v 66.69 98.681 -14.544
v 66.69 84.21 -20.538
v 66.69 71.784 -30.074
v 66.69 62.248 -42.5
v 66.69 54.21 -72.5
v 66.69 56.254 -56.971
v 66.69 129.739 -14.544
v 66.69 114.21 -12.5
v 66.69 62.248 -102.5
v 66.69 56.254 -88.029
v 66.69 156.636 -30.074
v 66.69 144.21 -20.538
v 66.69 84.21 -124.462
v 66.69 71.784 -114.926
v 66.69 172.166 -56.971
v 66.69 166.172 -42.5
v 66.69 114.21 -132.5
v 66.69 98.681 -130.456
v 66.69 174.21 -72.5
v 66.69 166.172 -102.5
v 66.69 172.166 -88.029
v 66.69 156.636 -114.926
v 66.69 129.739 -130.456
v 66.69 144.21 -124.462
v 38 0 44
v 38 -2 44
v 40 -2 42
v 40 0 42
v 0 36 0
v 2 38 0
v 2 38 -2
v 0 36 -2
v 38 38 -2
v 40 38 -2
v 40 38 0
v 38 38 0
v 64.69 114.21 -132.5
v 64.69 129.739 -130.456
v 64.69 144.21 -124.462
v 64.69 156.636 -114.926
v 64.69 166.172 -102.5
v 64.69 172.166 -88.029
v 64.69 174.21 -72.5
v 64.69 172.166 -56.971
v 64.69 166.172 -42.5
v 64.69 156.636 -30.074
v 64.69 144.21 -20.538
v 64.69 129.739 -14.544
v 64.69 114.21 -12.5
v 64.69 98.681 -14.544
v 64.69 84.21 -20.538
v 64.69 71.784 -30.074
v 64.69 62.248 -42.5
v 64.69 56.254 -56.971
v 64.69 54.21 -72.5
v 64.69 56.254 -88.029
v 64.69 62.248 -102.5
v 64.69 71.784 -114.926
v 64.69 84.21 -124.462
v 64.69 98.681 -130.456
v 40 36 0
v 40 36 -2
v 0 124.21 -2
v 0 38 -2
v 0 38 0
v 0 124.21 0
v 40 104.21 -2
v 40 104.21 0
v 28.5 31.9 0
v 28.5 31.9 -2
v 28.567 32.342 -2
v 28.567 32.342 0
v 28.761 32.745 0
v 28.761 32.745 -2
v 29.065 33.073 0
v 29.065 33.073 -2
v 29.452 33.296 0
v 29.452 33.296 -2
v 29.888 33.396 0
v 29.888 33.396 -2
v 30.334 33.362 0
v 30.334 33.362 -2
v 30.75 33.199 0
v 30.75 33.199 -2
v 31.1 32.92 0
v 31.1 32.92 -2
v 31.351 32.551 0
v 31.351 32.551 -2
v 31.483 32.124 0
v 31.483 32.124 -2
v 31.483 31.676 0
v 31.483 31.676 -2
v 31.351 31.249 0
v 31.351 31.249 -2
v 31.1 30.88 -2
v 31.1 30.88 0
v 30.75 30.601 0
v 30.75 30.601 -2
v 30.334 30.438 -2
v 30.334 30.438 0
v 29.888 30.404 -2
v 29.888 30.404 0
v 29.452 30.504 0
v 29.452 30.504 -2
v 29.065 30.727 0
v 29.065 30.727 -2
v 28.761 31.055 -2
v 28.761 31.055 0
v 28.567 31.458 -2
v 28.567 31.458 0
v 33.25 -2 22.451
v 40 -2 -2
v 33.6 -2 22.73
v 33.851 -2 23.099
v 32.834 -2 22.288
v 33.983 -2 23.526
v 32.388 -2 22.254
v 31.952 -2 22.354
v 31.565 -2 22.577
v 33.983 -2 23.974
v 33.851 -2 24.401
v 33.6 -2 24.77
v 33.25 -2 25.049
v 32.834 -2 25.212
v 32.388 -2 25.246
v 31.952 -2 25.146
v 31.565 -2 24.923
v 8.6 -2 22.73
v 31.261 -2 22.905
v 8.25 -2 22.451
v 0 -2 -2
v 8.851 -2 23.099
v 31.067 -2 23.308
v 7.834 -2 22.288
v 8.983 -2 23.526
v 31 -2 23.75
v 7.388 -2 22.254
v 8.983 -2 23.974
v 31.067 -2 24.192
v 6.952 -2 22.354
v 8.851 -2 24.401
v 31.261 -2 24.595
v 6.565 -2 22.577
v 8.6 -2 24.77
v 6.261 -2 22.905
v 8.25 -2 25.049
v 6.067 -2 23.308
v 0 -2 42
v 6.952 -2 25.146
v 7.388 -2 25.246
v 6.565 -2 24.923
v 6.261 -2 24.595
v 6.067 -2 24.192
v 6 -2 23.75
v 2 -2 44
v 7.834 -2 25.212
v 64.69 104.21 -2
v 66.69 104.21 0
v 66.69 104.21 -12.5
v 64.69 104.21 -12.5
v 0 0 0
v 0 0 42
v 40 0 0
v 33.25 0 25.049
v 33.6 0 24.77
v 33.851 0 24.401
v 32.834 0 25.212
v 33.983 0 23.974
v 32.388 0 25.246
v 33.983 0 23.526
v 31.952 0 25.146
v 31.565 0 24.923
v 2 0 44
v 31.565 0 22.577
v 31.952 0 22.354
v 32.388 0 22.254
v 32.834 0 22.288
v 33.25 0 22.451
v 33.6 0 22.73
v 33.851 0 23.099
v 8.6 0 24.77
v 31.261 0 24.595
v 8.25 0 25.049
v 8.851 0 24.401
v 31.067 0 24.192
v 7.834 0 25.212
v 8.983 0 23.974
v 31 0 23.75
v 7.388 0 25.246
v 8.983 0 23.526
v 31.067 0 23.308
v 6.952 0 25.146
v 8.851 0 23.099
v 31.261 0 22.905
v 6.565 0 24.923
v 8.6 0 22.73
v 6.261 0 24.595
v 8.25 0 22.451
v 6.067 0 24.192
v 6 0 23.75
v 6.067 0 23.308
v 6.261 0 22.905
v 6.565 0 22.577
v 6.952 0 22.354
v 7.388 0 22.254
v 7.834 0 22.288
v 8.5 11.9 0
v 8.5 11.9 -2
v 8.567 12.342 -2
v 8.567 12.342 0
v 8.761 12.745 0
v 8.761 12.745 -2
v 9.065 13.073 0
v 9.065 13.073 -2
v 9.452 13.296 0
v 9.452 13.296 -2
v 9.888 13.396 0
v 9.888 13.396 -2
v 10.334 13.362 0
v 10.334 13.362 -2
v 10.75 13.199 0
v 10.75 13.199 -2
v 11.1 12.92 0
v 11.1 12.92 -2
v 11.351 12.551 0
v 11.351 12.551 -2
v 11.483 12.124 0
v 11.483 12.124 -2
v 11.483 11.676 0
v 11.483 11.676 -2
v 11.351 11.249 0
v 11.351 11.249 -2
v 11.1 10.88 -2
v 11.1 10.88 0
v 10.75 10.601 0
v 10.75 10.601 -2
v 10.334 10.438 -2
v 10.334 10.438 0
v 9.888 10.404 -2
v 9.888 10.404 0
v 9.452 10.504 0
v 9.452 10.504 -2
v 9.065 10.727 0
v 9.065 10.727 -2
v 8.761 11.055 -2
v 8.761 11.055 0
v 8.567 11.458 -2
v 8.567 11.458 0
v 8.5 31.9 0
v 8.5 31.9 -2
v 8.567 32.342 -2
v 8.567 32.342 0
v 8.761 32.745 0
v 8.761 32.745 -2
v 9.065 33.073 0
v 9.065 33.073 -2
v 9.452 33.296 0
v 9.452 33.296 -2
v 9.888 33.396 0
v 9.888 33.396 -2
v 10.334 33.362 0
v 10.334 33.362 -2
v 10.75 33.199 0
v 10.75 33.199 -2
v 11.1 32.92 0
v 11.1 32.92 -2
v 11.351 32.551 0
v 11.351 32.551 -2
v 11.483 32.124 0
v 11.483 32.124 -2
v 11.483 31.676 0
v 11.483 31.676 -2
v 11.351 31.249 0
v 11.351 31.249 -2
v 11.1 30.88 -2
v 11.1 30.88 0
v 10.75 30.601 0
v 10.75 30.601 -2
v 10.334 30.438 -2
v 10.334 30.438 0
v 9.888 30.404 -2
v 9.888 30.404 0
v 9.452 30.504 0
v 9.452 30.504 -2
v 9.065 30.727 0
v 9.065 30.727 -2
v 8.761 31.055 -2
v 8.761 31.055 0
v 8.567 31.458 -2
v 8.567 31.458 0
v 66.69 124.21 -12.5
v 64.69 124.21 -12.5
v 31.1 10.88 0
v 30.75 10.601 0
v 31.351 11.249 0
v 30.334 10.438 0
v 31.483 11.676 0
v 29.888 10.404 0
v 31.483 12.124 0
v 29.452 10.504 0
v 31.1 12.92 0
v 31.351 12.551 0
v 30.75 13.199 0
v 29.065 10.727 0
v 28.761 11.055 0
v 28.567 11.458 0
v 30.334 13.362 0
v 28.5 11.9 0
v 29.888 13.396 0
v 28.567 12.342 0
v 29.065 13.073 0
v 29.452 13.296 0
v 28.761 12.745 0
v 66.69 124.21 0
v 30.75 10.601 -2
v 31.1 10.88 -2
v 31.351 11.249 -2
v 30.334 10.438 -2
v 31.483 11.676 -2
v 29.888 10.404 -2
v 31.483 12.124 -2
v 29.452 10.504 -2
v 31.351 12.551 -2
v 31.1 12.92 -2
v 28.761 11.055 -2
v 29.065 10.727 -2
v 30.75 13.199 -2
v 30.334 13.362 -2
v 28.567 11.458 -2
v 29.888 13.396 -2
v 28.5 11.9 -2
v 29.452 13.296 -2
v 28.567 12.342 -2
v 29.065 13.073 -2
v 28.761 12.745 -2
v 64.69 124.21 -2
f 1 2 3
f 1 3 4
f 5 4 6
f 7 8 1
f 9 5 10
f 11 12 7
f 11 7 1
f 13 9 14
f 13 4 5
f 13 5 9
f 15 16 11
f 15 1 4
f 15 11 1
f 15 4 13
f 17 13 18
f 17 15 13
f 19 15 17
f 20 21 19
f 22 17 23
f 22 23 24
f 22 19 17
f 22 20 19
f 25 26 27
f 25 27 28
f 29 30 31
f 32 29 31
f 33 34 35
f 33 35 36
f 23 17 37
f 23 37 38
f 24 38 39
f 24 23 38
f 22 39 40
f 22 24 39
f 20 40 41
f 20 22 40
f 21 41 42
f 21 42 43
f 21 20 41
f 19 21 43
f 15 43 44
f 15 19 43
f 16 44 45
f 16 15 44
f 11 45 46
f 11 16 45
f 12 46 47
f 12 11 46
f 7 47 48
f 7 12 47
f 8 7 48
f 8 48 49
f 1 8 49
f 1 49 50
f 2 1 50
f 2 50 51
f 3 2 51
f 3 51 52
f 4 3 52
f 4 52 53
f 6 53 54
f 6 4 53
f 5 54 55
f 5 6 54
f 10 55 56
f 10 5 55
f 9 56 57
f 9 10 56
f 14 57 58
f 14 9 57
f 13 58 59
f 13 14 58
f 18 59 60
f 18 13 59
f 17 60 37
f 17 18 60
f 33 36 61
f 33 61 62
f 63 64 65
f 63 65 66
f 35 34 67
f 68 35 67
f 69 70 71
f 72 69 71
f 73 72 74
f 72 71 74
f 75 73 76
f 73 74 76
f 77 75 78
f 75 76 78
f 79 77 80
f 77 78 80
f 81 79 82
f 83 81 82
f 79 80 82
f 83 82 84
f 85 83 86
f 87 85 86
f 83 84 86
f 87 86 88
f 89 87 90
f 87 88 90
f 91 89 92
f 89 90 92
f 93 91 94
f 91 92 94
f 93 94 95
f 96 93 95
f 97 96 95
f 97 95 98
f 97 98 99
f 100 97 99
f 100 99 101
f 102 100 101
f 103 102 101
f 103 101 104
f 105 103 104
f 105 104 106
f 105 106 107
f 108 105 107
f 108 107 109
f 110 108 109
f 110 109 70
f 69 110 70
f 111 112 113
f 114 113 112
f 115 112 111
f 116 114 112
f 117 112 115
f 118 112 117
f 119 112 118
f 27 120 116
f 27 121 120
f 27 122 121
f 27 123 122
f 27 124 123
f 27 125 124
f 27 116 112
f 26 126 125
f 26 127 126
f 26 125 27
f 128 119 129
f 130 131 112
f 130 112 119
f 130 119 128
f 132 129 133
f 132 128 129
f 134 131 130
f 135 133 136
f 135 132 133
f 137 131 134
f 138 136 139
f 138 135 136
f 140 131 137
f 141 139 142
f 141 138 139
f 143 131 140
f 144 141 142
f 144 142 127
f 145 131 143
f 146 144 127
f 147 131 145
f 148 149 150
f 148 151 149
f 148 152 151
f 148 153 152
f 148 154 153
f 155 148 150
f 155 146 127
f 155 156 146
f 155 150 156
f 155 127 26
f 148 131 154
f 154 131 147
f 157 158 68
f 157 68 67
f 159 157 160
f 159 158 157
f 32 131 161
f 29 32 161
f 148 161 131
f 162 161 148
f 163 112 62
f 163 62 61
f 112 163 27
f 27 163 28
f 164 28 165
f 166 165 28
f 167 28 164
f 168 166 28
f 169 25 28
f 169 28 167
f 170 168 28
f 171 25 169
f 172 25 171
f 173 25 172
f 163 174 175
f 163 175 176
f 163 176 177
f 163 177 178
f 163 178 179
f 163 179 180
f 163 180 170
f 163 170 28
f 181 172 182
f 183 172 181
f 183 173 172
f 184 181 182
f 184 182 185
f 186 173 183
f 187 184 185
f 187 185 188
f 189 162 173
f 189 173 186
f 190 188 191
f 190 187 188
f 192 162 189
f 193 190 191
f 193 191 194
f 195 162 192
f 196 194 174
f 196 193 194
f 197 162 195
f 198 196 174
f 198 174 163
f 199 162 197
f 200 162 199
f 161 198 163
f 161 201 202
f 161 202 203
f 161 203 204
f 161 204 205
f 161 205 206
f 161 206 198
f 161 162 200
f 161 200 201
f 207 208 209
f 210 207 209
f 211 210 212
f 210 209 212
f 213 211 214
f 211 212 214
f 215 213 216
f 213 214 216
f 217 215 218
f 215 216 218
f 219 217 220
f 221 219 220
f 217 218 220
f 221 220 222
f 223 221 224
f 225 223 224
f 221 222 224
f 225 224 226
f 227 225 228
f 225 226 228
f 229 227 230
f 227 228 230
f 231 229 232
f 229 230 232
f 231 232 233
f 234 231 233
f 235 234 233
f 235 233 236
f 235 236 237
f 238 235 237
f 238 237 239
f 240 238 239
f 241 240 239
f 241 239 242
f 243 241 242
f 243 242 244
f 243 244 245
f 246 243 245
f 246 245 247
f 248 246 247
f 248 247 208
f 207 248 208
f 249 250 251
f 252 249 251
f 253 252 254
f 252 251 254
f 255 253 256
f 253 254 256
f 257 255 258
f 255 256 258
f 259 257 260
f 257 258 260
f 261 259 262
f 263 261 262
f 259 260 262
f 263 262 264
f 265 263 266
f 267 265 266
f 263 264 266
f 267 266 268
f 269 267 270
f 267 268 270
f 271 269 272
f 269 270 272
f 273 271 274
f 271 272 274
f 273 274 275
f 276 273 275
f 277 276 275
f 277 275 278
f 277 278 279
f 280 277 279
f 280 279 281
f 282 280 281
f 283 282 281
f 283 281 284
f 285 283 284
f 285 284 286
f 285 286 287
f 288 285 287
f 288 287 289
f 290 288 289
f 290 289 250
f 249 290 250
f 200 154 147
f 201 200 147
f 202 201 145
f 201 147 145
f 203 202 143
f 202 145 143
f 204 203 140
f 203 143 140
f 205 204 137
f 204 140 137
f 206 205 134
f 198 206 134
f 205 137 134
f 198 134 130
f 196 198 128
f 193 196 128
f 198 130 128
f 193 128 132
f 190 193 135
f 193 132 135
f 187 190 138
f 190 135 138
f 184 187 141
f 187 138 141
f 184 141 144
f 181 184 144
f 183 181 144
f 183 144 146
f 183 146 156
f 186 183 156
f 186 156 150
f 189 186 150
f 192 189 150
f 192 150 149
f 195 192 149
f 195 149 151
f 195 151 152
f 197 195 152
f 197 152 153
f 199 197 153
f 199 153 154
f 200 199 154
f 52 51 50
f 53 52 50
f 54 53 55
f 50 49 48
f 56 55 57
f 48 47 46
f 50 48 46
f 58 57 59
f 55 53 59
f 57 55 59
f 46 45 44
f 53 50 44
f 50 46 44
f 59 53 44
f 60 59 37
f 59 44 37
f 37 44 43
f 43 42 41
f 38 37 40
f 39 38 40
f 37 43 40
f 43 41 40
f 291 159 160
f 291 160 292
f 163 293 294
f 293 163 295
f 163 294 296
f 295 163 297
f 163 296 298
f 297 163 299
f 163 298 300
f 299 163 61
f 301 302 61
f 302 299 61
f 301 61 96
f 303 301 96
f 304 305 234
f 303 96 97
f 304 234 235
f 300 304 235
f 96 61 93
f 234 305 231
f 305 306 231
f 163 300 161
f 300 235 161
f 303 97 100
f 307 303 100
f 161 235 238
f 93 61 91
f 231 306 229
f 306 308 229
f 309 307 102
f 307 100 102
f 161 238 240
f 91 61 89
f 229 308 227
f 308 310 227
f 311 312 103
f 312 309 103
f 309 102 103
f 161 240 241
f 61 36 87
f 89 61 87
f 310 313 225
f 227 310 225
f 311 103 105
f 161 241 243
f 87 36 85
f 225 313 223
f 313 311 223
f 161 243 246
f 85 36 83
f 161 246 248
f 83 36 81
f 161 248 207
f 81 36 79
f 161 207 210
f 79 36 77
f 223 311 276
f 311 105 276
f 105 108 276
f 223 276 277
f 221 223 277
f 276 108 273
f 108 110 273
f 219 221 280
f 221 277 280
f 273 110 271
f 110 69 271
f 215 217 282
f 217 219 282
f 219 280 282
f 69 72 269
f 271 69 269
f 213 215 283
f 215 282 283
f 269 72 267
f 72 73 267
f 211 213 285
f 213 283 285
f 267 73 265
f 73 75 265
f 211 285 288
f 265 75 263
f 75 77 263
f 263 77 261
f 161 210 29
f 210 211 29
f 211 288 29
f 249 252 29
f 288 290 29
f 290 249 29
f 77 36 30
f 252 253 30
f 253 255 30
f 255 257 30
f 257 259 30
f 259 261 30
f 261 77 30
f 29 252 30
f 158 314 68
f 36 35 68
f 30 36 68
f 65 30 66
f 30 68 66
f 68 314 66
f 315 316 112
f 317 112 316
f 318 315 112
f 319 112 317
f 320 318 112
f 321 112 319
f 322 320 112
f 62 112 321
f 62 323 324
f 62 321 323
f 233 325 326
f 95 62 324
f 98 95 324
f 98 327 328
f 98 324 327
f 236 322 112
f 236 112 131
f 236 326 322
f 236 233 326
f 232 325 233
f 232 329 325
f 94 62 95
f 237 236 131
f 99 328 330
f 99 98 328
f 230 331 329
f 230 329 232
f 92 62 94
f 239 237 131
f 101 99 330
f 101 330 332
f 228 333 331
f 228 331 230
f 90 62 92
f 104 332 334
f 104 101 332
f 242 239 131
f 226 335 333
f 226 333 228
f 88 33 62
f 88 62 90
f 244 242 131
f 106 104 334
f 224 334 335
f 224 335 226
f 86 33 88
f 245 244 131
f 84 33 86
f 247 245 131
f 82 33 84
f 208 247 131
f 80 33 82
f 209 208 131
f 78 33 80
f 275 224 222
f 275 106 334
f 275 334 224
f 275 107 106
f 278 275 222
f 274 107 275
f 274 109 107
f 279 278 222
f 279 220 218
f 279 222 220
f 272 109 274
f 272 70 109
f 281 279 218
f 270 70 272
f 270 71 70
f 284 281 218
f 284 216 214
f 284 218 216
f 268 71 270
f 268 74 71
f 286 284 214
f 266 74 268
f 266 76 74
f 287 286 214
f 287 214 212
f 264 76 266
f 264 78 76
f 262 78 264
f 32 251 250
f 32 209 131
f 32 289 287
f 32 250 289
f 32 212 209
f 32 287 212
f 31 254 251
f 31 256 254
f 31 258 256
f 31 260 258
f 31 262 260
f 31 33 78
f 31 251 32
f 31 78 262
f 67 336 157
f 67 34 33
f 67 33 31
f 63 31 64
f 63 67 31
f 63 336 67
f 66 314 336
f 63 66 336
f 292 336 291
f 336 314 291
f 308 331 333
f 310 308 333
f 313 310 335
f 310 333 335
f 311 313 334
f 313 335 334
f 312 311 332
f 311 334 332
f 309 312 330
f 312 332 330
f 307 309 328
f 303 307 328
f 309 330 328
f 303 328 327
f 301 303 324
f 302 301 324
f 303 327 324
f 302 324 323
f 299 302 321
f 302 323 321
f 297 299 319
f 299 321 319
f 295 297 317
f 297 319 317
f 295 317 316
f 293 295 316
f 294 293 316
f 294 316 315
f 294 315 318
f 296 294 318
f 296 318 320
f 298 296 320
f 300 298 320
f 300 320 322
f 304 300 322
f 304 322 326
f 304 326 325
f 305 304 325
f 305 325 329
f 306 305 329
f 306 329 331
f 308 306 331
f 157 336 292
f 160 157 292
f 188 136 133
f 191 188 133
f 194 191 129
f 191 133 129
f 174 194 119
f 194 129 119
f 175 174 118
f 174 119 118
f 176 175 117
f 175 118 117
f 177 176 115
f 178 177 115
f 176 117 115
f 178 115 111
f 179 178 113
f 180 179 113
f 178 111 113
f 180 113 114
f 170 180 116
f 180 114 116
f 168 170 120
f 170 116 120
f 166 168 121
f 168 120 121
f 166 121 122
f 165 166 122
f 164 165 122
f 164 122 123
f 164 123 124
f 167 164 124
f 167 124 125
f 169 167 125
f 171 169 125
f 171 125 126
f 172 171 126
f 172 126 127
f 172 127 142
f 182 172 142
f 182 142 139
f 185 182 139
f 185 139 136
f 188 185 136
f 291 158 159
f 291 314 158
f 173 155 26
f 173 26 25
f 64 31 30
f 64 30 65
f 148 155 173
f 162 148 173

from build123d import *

# Parameters (mm, degrees)
EXTRUDE1_DEPTH      = 40
EXTRUDE2_REACH      = 42
SKETCH2_R           = 1.5
EXTRUDE3_REACH      = 48
SKETCH3_R           = 1.5
CHAMFER1_SIZE       = 2
SKETCH9_W           = 40
SKETCH9_H           = 86.21
BOSS_EXTRUDE1_DEPTH = 2
SKETCH11_W          = 26.69
SKETCH11_H          = 20
BOSS_EXTRUDE2_DEPTH = 2
SKETCH13_W          = 10.5
SKETCH13_H          = 20
BOSS_EXTRUDE3_DEPTH = 2
SKETCH14_R          = 60
BOSS_EXTRUDE4_DEPTH = 2


with BuildPart() as part:
    # Sketch1 → Extrude1 (new body)
    with BuildSketch(Plane(origin=(0, 0, 0), x_dir=(0, 0, -1), z_dir=(1, 0, 0))):
        Polygon((0, 0), (0, 38), (2, 38), (2, -2), (-44, -2), (-44, 0), align=None)
    extrude(amount=EXTRUDE1_DEPTH)

    # Sketch2 → Extrude2 (cut, up to next)
    with BuildSketch(Plane(origin=(0, -2, 0), x_dir=(-1, 0, 0), z_dir=(0, -1, 0)), mode=Mode.PRIVATE) as extrude2_sk1:
        with Locations((-32.5, -23.75)):
            Circle(SKETCH2_R)
    extrude2_tool1 = extrude(extrude2_sk1.sketch, amount=-EXTRUDE2_REACH, mode=Mode.PRIVATE) & part.part
    add(extrude2_tool1.solids().sort_by_distance((32.5, -2, 23.75))[0], mode=Mode.SUBTRACT)
    # Sketch2 → Extrude2 (cut, up to next)
    with BuildSketch(Plane(origin=(0, -2, 0), x_dir=(-1, 0, 0), z_dir=(0, -1, 0)), mode=Mode.PRIVATE) as extrude2_sk2:
        with Locations((-7.5, -23.75)):
            Circle(SKETCH2_R)
    extrude2_tool2 = extrude(extrude2_sk2.sketch, amount=-EXTRUDE2_REACH, mode=Mode.PRIVATE) & part.part
    add(extrude2_tool2.solids().sort_by_distance((7.5, -2, 23.75))[0], mode=Mode.SUBTRACT)

    # Sketch3 → Extrude3 (cut, up to next)
    with BuildSketch(Plane(origin=(0, 0, -2), x_dir=(-1, 0, 0), z_dir=(0, 0, -1)), mode=Mode.PRIVATE) as extrude3_sk1:
        with Locations((-10, 31.9)):
            Circle(SKETCH3_R)
    extrude3_tool1 = extrude(extrude3_sk1.sketch, amount=-EXTRUDE3_REACH, mode=Mode.PRIVATE) & part.part
    add(extrude3_tool1.solids().sort_by_distance((10, 31.9, -2))[0], mode=Mode.SUBTRACT)
    # Sketch3 → Extrude3 (cut, up to next)
    with BuildSketch(Plane(origin=(0, 0, -2), x_dir=(-1, 0, 0), z_dir=(0, 0, -1)), mode=Mode.PRIVATE) as extrude3_sk2:
        with Locations((-30, 31.9)):
            Circle(SKETCH3_R)
    extrude3_tool2 = extrude(extrude3_sk2.sketch, amount=-EXTRUDE3_REACH, mode=Mode.PRIVATE) & part.part
    add(extrude3_tool2.solids().sort_by_distance((30, 31.9, -2))[0], mode=Mode.SUBTRACT)
    # Sketch3 → Extrude3 (cut, up to next)
    with BuildSketch(Plane(origin=(0, 0, -2), x_dir=(-1, 0, 0), z_dir=(0, 0, -1)), mode=Mode.PRIVATE) as extrude3_sk3:
        with Locations((-30, 11.9)):
            Circle(SKETCH3_R)
    extrude3_tool3 = extrude(extrude3_sk3.sketch, amount=-EXTRUDE3_REACH, mode=Mode.PRIVATE) & part.part
    add(extrude3_tool3.solids().sort_by_distance((30, 11.9, -2))[0], mode=Mode.SUBTRACT)
    # Sketch3 → Extrude3 (cut, up to next)
    with BuildSketch(Plane(origin=(0, 0, -2), x_dir=(-1, 0, 0), z_dir=(0, 0, -1)), mode=Mode.PRIVATE) as extrude3_sk4:
        with Locations((-10, 11.9)):
            Circle(SKETCH3_R)
    extrude3_tool4 = extrude(extrude3_sk4.sketch, amount=-EXTRUDE3_REACH, mode=Mode.PRIVATE) & part.part
    add(extrude3_tool4.solids().sort_by_distance((10, 11.9, -2))[0], mode=Mode.SUBTRACT)

    # Chamfer1
    chamfer1_edges = [part.edges().sort_by_distance(p)[0] for p in [
        (40, 38, -1),
        (0, 38, -1),
        (40, -1, 44),
        (0, -1, 44),
    ]]
    chamfer(chamfer1_edges, length=CHAMFER1_SIZE)

    # Sketch9 → Boss-Extrude1 (add)
    with BuildSketch(Plane(origin=(0, 0, -2), x_dir=(-1, 0, 0), z_dir=(0, 0, -1))):
        with Locations((-20, 81.105)):
            Rectangle(SKETCH9_W, SKETCH9_H)
    extrude(amount=-BOSS_EXTRUDE1_DEPTH)

    # Sketch11 → Boss-Extrude2 (add)
    with BuildSketch(Plane(origin=(0, 0, -2), x_dir=(-1, 0, 0), z_dir=(0, 0, -1))):
        with Locations((-53.345, 114.21)):
            Rectangle(SKETCH11_W, SKETCH11_H)
    extrude(amount=-BOSS_EXTRUDE2_DEPTH)

    # Sketch13 → Boss-Extrude3 (add)
    with BuildSketch(Plane(origin=(66.69, 0, 0), x_dir=(0, 0, -1), z_dir=(1, 0, 0))):
        with Locations((7.25, 114.21)):
            Rectangle(SKETCH13_W, SKETCH13_H)
    extrude(amount=-BOSS_EXTRUDE3_DEPTH)


with BuildPart() as body_2:
    # Sketch14 → Boss-Extrude4 (new body)
    with BuildSketch(Plane(origin=(66.69, 0, 0), x_dir=(0, 0, -1), z_dir=(1, 0, 0))):
        with Locations((72.5, 114.21)):
            Circle(SKETCH14_R)
    extrude(amount=-BOSS_EXTRUDE4_DEPTH)


solid = Compound([part.part, body_2.part])
